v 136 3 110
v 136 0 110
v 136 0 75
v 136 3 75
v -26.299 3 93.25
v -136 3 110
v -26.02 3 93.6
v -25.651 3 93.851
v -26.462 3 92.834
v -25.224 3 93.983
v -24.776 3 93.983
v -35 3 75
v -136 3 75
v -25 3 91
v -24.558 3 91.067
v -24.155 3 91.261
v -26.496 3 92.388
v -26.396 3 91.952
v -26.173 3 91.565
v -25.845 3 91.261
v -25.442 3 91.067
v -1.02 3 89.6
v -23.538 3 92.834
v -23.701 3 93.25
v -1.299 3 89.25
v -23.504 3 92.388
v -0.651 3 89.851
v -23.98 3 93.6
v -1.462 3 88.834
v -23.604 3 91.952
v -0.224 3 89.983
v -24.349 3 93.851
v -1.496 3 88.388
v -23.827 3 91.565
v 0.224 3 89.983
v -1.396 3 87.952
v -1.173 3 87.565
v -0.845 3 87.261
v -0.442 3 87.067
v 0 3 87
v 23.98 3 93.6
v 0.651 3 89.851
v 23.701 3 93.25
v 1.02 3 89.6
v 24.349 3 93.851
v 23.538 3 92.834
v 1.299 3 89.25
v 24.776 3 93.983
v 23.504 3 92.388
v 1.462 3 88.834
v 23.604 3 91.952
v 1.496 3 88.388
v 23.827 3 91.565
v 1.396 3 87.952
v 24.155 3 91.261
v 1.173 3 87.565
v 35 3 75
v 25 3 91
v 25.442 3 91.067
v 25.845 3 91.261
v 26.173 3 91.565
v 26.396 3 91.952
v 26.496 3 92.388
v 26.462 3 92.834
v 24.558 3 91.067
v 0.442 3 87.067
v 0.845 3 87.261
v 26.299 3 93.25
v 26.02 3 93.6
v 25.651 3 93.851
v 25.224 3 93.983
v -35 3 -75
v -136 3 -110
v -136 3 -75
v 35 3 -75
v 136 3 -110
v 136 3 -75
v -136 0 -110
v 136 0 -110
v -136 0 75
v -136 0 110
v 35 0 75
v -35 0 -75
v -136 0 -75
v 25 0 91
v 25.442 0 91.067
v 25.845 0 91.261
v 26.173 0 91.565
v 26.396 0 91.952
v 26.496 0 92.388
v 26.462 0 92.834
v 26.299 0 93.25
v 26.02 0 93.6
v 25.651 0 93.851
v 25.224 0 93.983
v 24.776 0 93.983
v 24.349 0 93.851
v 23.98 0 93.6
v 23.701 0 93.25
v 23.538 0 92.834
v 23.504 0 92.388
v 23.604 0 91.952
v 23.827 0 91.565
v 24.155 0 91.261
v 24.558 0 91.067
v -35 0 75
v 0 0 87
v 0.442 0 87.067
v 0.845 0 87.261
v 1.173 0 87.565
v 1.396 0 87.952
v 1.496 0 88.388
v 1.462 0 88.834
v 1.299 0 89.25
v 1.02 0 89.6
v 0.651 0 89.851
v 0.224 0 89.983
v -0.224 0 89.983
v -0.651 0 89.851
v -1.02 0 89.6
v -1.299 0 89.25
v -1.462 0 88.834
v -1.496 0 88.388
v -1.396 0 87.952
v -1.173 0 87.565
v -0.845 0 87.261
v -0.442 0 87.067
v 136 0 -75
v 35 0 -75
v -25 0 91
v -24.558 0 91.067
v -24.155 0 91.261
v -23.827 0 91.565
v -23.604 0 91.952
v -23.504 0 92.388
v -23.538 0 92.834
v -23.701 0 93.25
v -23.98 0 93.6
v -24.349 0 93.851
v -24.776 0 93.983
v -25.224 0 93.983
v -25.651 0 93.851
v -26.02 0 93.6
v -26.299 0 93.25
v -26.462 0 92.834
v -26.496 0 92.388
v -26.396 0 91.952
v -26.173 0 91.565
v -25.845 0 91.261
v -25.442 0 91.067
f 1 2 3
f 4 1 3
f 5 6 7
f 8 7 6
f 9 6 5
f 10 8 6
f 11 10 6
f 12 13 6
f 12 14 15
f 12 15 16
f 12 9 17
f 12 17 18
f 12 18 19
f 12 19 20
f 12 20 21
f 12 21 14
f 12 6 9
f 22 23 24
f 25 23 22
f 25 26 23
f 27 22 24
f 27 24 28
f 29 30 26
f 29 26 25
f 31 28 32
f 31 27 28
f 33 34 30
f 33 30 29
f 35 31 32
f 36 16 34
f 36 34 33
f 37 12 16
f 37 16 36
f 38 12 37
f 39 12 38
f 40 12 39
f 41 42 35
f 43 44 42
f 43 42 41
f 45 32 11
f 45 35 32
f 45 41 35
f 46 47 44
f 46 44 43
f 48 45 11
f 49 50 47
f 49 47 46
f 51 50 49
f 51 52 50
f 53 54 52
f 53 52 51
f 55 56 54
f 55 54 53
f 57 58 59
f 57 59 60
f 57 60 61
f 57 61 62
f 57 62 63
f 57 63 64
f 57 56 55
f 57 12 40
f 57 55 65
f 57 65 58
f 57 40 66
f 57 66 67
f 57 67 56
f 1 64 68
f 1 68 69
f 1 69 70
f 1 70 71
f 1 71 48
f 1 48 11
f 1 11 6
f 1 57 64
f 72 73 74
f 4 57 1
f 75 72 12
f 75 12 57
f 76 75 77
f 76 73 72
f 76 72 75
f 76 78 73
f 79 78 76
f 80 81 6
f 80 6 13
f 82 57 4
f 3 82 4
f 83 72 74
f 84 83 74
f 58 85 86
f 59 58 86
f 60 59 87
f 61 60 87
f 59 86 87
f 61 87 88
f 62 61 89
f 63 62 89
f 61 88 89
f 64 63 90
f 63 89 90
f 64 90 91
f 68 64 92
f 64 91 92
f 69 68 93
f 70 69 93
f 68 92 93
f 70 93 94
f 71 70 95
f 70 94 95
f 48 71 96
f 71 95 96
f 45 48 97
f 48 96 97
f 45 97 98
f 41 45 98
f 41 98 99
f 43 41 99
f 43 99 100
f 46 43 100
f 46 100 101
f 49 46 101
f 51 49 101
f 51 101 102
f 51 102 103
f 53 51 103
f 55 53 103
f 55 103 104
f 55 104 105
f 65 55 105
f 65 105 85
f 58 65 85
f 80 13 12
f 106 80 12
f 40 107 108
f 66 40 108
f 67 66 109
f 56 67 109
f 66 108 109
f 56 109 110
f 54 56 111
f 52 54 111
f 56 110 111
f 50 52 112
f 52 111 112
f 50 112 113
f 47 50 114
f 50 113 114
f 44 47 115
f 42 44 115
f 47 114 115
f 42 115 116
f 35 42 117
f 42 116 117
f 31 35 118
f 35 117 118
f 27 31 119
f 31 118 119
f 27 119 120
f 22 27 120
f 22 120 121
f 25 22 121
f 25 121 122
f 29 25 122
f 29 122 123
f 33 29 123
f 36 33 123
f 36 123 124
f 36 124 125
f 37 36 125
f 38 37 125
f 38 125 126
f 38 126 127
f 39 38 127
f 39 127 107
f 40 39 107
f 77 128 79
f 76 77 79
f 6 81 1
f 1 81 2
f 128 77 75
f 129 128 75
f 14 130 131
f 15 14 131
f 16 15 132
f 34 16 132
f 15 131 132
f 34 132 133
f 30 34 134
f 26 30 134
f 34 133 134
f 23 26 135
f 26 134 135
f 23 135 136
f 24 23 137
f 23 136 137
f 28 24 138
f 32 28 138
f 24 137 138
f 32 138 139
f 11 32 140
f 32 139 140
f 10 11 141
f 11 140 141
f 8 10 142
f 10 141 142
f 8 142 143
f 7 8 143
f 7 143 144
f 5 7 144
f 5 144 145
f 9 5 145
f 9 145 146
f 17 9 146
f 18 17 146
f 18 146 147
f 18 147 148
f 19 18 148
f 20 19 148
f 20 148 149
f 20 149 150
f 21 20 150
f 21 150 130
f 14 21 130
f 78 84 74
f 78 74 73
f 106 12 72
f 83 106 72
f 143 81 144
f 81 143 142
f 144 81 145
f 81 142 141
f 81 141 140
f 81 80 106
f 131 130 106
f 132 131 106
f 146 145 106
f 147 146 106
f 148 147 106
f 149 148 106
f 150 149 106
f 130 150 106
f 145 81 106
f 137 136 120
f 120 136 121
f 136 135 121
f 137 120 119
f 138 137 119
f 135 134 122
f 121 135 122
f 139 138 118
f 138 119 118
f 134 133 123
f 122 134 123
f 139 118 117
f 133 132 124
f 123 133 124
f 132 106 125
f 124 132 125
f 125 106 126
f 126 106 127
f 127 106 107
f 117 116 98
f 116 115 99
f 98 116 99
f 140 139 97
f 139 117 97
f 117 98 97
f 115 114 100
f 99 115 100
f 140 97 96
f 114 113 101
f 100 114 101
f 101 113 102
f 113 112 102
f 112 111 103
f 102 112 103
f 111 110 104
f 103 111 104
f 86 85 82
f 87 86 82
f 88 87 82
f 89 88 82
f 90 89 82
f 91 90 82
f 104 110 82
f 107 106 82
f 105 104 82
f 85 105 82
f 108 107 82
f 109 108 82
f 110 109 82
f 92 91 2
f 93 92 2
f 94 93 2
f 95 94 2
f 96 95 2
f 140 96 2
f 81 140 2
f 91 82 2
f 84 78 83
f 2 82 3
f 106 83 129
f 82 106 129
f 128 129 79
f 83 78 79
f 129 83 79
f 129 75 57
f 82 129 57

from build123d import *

# Parameters (mm, degrees)
SKETCH1_W           = 272
SKETCH1_H           = 220
BOSS_EXTRUDE1_DEPTH = 3
SKETCH2_OUTSIDE_W   = 343.97
SKETCH2_OUTSIDE_H   = 291.97
CUT_EXTRUDE1_DEPTH  = 175.94284781
SKETCH3_R           = 1.5
CUT_EXTRUDE2_DEPTH  = 175.94284781
SKETCH5_R           = 1.5
CUT_EXTRUDE4_DEPTH  = 175.94284781


with BuildPart() as part:
    # Sketch1 → Boss-Extrude1 (new body)
    with BuildSketch(Plane(origin=(0, 0, 0), x_dir=(1, 0, 0), z_dir=(0, 1, 0))):
        Rectangle(SKETCH1_W, SKETCH1_H)
    extrude(amount=BOSS_EXTRUDE1_DEPTH)

    # Sketch2 outside → Cut-Extrude1 (cut, through all)
    with BuildSketch(Plane(origin=(0, 3, 0), x_dir=(1, 0, 0), z_dir=(0, 1, 0))):
        Rectangle(SKETCH2_OUTSIDE_W, SKETCH2_OUTSIDE_H)
        Polygon((-136, 110), (136, 110), (136, 75), (35, 75), (35, -75), (136, -75), (136, -110), (-136, -110), (-136, -75), (-35, -75), (-35, 75), (-136, 75), align=None, mode=Mode.SUBTRACT)
    extrude(amount=-CUT_EXTRUDE1_DEPTH, mode=Mode.SUBTRACT)

    # Sketch3 → Cut-Extrude2 (cut, through all)
    with BuildSketch(Plane.XZ):
        with Locations(Location((25, 92.5, 0), (0, 0, 270))):
            Circle(SKETCH3_R)
        with Locations(Location((-25, 92.5, 0), (0, 0, 270))):
            Circle(SKETCH3_R)
    extrude(amount=-CUT_EXTRUDE2_DEPTH, mode=Mode.SUBTRACT)

    # Sketch5 → Cut-Extrude4 (cut, through all)
    with BuildSketch(Plane.XZ):
        with Locations(Location((0, 88.5, 0), (0, 0, 270))):
            Circle(SKETCH5_R)
    extrude(amount=-CUT_EXTRUDE4_DEPTH, mode=Mode.SUBTRACT)


solid = part.part
